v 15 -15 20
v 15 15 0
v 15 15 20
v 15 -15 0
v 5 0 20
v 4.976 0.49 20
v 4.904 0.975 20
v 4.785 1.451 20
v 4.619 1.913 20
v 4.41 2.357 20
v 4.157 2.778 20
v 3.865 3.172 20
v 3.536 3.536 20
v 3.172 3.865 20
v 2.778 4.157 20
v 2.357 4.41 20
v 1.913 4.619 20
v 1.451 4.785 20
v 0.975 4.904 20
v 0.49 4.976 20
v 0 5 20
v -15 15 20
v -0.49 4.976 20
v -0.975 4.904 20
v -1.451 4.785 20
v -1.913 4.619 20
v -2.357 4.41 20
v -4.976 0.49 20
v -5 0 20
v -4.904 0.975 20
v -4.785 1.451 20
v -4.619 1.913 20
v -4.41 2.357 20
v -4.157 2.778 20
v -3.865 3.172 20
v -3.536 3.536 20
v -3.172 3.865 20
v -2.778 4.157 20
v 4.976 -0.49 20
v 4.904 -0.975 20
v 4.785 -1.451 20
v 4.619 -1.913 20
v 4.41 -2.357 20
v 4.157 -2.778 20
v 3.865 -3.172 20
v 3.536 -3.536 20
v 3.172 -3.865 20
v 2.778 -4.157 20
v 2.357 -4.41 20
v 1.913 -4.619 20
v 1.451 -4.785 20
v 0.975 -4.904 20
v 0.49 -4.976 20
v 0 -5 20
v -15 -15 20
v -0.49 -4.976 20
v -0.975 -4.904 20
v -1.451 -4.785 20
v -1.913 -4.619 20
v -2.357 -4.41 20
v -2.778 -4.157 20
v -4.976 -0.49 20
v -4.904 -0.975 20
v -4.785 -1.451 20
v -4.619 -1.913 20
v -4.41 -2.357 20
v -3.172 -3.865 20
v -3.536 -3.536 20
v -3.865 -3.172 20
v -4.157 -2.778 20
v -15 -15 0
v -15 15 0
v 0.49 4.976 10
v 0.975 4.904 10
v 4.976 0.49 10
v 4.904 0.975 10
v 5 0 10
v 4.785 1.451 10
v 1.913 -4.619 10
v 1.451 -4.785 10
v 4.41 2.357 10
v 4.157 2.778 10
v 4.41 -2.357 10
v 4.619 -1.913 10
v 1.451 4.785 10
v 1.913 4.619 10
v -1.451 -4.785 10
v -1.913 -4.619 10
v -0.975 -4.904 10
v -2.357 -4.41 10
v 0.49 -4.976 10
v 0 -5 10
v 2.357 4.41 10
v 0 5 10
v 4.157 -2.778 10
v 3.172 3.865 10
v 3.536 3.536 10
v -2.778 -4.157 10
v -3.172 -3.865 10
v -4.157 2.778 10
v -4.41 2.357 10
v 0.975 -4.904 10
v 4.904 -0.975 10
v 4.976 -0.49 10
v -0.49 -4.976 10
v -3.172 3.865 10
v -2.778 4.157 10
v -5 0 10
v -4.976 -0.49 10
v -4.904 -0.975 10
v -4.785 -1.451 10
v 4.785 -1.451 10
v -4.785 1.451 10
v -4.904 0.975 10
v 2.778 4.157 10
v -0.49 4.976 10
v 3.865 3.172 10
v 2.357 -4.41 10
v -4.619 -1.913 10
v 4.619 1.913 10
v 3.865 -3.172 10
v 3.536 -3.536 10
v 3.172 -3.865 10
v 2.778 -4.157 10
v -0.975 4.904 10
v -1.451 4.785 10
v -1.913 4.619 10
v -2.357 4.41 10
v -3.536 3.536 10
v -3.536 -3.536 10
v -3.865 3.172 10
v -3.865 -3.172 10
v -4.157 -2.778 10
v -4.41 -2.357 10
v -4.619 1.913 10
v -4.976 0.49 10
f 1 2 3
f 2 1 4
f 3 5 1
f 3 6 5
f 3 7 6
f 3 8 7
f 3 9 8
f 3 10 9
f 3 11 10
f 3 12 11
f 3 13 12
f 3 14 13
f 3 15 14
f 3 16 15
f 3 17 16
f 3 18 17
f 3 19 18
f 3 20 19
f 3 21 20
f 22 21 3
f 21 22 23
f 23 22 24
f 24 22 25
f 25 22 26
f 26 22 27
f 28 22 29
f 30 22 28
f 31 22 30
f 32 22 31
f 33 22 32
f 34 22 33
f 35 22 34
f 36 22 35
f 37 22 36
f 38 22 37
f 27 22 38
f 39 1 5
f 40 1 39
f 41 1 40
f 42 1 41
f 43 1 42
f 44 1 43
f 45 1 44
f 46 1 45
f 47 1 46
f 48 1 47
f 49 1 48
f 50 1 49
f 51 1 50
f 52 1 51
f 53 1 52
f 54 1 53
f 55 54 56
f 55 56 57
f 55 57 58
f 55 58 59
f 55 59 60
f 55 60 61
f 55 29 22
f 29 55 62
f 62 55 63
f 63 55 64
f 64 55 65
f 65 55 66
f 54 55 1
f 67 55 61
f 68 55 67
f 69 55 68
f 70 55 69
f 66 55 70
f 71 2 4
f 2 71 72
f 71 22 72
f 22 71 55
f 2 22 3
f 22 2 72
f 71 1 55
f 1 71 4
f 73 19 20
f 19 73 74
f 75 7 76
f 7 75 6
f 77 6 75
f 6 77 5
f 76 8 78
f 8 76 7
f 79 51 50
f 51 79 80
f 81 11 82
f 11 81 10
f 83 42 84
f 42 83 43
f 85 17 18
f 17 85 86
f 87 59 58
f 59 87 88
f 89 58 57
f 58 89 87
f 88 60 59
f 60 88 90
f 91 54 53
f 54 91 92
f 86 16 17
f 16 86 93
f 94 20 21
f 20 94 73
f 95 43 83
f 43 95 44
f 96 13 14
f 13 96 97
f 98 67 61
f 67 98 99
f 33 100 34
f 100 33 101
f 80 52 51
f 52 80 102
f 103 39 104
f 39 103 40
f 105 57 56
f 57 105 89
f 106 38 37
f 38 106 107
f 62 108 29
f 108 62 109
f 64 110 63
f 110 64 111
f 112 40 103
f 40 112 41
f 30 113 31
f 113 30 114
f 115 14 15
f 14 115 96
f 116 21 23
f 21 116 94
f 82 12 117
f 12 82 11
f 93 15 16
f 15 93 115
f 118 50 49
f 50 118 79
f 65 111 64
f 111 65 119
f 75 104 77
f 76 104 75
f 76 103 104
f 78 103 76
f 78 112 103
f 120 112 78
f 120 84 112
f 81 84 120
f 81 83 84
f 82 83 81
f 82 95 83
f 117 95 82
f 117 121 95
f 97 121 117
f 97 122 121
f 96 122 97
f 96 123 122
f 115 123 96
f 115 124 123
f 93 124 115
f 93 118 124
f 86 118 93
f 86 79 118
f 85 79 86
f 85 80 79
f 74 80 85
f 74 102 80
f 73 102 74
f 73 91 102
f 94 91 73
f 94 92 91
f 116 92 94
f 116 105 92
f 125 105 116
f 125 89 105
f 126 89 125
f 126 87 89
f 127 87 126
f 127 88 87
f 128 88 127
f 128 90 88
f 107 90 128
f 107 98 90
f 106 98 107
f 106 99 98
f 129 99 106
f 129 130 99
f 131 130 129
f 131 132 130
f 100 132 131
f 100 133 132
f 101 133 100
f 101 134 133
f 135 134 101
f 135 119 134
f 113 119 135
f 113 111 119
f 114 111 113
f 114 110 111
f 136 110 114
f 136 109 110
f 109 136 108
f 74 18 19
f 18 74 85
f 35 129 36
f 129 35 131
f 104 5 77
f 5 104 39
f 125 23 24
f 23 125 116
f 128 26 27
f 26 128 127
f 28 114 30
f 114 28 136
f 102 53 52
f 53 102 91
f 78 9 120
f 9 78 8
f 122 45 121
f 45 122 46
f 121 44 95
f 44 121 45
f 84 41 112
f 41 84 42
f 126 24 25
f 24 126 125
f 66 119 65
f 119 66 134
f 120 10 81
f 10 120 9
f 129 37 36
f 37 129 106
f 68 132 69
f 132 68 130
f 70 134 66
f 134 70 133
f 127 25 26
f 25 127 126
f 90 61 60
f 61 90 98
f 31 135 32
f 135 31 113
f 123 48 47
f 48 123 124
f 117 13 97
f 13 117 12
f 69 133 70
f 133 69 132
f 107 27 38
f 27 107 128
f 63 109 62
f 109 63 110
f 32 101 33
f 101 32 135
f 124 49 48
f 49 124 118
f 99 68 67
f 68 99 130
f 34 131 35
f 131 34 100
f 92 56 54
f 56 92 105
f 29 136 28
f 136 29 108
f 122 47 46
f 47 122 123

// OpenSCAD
module shaft_support_bracket() {
    difference() {
        union() {
            // Base block
            translate([-15, -15, 0])
                cube([30, 30, 20]);
            // Cylinder for rod
            translate([0, 0, 10])
                cylinder(h = 10, d = 20, $fn = 64);
        }
        // Hole for the rod
        translate([0, 0, 10])
            cylinder(h = 20, d = 10, $fn = 64);
    }
}

shaft_support_bracket();
